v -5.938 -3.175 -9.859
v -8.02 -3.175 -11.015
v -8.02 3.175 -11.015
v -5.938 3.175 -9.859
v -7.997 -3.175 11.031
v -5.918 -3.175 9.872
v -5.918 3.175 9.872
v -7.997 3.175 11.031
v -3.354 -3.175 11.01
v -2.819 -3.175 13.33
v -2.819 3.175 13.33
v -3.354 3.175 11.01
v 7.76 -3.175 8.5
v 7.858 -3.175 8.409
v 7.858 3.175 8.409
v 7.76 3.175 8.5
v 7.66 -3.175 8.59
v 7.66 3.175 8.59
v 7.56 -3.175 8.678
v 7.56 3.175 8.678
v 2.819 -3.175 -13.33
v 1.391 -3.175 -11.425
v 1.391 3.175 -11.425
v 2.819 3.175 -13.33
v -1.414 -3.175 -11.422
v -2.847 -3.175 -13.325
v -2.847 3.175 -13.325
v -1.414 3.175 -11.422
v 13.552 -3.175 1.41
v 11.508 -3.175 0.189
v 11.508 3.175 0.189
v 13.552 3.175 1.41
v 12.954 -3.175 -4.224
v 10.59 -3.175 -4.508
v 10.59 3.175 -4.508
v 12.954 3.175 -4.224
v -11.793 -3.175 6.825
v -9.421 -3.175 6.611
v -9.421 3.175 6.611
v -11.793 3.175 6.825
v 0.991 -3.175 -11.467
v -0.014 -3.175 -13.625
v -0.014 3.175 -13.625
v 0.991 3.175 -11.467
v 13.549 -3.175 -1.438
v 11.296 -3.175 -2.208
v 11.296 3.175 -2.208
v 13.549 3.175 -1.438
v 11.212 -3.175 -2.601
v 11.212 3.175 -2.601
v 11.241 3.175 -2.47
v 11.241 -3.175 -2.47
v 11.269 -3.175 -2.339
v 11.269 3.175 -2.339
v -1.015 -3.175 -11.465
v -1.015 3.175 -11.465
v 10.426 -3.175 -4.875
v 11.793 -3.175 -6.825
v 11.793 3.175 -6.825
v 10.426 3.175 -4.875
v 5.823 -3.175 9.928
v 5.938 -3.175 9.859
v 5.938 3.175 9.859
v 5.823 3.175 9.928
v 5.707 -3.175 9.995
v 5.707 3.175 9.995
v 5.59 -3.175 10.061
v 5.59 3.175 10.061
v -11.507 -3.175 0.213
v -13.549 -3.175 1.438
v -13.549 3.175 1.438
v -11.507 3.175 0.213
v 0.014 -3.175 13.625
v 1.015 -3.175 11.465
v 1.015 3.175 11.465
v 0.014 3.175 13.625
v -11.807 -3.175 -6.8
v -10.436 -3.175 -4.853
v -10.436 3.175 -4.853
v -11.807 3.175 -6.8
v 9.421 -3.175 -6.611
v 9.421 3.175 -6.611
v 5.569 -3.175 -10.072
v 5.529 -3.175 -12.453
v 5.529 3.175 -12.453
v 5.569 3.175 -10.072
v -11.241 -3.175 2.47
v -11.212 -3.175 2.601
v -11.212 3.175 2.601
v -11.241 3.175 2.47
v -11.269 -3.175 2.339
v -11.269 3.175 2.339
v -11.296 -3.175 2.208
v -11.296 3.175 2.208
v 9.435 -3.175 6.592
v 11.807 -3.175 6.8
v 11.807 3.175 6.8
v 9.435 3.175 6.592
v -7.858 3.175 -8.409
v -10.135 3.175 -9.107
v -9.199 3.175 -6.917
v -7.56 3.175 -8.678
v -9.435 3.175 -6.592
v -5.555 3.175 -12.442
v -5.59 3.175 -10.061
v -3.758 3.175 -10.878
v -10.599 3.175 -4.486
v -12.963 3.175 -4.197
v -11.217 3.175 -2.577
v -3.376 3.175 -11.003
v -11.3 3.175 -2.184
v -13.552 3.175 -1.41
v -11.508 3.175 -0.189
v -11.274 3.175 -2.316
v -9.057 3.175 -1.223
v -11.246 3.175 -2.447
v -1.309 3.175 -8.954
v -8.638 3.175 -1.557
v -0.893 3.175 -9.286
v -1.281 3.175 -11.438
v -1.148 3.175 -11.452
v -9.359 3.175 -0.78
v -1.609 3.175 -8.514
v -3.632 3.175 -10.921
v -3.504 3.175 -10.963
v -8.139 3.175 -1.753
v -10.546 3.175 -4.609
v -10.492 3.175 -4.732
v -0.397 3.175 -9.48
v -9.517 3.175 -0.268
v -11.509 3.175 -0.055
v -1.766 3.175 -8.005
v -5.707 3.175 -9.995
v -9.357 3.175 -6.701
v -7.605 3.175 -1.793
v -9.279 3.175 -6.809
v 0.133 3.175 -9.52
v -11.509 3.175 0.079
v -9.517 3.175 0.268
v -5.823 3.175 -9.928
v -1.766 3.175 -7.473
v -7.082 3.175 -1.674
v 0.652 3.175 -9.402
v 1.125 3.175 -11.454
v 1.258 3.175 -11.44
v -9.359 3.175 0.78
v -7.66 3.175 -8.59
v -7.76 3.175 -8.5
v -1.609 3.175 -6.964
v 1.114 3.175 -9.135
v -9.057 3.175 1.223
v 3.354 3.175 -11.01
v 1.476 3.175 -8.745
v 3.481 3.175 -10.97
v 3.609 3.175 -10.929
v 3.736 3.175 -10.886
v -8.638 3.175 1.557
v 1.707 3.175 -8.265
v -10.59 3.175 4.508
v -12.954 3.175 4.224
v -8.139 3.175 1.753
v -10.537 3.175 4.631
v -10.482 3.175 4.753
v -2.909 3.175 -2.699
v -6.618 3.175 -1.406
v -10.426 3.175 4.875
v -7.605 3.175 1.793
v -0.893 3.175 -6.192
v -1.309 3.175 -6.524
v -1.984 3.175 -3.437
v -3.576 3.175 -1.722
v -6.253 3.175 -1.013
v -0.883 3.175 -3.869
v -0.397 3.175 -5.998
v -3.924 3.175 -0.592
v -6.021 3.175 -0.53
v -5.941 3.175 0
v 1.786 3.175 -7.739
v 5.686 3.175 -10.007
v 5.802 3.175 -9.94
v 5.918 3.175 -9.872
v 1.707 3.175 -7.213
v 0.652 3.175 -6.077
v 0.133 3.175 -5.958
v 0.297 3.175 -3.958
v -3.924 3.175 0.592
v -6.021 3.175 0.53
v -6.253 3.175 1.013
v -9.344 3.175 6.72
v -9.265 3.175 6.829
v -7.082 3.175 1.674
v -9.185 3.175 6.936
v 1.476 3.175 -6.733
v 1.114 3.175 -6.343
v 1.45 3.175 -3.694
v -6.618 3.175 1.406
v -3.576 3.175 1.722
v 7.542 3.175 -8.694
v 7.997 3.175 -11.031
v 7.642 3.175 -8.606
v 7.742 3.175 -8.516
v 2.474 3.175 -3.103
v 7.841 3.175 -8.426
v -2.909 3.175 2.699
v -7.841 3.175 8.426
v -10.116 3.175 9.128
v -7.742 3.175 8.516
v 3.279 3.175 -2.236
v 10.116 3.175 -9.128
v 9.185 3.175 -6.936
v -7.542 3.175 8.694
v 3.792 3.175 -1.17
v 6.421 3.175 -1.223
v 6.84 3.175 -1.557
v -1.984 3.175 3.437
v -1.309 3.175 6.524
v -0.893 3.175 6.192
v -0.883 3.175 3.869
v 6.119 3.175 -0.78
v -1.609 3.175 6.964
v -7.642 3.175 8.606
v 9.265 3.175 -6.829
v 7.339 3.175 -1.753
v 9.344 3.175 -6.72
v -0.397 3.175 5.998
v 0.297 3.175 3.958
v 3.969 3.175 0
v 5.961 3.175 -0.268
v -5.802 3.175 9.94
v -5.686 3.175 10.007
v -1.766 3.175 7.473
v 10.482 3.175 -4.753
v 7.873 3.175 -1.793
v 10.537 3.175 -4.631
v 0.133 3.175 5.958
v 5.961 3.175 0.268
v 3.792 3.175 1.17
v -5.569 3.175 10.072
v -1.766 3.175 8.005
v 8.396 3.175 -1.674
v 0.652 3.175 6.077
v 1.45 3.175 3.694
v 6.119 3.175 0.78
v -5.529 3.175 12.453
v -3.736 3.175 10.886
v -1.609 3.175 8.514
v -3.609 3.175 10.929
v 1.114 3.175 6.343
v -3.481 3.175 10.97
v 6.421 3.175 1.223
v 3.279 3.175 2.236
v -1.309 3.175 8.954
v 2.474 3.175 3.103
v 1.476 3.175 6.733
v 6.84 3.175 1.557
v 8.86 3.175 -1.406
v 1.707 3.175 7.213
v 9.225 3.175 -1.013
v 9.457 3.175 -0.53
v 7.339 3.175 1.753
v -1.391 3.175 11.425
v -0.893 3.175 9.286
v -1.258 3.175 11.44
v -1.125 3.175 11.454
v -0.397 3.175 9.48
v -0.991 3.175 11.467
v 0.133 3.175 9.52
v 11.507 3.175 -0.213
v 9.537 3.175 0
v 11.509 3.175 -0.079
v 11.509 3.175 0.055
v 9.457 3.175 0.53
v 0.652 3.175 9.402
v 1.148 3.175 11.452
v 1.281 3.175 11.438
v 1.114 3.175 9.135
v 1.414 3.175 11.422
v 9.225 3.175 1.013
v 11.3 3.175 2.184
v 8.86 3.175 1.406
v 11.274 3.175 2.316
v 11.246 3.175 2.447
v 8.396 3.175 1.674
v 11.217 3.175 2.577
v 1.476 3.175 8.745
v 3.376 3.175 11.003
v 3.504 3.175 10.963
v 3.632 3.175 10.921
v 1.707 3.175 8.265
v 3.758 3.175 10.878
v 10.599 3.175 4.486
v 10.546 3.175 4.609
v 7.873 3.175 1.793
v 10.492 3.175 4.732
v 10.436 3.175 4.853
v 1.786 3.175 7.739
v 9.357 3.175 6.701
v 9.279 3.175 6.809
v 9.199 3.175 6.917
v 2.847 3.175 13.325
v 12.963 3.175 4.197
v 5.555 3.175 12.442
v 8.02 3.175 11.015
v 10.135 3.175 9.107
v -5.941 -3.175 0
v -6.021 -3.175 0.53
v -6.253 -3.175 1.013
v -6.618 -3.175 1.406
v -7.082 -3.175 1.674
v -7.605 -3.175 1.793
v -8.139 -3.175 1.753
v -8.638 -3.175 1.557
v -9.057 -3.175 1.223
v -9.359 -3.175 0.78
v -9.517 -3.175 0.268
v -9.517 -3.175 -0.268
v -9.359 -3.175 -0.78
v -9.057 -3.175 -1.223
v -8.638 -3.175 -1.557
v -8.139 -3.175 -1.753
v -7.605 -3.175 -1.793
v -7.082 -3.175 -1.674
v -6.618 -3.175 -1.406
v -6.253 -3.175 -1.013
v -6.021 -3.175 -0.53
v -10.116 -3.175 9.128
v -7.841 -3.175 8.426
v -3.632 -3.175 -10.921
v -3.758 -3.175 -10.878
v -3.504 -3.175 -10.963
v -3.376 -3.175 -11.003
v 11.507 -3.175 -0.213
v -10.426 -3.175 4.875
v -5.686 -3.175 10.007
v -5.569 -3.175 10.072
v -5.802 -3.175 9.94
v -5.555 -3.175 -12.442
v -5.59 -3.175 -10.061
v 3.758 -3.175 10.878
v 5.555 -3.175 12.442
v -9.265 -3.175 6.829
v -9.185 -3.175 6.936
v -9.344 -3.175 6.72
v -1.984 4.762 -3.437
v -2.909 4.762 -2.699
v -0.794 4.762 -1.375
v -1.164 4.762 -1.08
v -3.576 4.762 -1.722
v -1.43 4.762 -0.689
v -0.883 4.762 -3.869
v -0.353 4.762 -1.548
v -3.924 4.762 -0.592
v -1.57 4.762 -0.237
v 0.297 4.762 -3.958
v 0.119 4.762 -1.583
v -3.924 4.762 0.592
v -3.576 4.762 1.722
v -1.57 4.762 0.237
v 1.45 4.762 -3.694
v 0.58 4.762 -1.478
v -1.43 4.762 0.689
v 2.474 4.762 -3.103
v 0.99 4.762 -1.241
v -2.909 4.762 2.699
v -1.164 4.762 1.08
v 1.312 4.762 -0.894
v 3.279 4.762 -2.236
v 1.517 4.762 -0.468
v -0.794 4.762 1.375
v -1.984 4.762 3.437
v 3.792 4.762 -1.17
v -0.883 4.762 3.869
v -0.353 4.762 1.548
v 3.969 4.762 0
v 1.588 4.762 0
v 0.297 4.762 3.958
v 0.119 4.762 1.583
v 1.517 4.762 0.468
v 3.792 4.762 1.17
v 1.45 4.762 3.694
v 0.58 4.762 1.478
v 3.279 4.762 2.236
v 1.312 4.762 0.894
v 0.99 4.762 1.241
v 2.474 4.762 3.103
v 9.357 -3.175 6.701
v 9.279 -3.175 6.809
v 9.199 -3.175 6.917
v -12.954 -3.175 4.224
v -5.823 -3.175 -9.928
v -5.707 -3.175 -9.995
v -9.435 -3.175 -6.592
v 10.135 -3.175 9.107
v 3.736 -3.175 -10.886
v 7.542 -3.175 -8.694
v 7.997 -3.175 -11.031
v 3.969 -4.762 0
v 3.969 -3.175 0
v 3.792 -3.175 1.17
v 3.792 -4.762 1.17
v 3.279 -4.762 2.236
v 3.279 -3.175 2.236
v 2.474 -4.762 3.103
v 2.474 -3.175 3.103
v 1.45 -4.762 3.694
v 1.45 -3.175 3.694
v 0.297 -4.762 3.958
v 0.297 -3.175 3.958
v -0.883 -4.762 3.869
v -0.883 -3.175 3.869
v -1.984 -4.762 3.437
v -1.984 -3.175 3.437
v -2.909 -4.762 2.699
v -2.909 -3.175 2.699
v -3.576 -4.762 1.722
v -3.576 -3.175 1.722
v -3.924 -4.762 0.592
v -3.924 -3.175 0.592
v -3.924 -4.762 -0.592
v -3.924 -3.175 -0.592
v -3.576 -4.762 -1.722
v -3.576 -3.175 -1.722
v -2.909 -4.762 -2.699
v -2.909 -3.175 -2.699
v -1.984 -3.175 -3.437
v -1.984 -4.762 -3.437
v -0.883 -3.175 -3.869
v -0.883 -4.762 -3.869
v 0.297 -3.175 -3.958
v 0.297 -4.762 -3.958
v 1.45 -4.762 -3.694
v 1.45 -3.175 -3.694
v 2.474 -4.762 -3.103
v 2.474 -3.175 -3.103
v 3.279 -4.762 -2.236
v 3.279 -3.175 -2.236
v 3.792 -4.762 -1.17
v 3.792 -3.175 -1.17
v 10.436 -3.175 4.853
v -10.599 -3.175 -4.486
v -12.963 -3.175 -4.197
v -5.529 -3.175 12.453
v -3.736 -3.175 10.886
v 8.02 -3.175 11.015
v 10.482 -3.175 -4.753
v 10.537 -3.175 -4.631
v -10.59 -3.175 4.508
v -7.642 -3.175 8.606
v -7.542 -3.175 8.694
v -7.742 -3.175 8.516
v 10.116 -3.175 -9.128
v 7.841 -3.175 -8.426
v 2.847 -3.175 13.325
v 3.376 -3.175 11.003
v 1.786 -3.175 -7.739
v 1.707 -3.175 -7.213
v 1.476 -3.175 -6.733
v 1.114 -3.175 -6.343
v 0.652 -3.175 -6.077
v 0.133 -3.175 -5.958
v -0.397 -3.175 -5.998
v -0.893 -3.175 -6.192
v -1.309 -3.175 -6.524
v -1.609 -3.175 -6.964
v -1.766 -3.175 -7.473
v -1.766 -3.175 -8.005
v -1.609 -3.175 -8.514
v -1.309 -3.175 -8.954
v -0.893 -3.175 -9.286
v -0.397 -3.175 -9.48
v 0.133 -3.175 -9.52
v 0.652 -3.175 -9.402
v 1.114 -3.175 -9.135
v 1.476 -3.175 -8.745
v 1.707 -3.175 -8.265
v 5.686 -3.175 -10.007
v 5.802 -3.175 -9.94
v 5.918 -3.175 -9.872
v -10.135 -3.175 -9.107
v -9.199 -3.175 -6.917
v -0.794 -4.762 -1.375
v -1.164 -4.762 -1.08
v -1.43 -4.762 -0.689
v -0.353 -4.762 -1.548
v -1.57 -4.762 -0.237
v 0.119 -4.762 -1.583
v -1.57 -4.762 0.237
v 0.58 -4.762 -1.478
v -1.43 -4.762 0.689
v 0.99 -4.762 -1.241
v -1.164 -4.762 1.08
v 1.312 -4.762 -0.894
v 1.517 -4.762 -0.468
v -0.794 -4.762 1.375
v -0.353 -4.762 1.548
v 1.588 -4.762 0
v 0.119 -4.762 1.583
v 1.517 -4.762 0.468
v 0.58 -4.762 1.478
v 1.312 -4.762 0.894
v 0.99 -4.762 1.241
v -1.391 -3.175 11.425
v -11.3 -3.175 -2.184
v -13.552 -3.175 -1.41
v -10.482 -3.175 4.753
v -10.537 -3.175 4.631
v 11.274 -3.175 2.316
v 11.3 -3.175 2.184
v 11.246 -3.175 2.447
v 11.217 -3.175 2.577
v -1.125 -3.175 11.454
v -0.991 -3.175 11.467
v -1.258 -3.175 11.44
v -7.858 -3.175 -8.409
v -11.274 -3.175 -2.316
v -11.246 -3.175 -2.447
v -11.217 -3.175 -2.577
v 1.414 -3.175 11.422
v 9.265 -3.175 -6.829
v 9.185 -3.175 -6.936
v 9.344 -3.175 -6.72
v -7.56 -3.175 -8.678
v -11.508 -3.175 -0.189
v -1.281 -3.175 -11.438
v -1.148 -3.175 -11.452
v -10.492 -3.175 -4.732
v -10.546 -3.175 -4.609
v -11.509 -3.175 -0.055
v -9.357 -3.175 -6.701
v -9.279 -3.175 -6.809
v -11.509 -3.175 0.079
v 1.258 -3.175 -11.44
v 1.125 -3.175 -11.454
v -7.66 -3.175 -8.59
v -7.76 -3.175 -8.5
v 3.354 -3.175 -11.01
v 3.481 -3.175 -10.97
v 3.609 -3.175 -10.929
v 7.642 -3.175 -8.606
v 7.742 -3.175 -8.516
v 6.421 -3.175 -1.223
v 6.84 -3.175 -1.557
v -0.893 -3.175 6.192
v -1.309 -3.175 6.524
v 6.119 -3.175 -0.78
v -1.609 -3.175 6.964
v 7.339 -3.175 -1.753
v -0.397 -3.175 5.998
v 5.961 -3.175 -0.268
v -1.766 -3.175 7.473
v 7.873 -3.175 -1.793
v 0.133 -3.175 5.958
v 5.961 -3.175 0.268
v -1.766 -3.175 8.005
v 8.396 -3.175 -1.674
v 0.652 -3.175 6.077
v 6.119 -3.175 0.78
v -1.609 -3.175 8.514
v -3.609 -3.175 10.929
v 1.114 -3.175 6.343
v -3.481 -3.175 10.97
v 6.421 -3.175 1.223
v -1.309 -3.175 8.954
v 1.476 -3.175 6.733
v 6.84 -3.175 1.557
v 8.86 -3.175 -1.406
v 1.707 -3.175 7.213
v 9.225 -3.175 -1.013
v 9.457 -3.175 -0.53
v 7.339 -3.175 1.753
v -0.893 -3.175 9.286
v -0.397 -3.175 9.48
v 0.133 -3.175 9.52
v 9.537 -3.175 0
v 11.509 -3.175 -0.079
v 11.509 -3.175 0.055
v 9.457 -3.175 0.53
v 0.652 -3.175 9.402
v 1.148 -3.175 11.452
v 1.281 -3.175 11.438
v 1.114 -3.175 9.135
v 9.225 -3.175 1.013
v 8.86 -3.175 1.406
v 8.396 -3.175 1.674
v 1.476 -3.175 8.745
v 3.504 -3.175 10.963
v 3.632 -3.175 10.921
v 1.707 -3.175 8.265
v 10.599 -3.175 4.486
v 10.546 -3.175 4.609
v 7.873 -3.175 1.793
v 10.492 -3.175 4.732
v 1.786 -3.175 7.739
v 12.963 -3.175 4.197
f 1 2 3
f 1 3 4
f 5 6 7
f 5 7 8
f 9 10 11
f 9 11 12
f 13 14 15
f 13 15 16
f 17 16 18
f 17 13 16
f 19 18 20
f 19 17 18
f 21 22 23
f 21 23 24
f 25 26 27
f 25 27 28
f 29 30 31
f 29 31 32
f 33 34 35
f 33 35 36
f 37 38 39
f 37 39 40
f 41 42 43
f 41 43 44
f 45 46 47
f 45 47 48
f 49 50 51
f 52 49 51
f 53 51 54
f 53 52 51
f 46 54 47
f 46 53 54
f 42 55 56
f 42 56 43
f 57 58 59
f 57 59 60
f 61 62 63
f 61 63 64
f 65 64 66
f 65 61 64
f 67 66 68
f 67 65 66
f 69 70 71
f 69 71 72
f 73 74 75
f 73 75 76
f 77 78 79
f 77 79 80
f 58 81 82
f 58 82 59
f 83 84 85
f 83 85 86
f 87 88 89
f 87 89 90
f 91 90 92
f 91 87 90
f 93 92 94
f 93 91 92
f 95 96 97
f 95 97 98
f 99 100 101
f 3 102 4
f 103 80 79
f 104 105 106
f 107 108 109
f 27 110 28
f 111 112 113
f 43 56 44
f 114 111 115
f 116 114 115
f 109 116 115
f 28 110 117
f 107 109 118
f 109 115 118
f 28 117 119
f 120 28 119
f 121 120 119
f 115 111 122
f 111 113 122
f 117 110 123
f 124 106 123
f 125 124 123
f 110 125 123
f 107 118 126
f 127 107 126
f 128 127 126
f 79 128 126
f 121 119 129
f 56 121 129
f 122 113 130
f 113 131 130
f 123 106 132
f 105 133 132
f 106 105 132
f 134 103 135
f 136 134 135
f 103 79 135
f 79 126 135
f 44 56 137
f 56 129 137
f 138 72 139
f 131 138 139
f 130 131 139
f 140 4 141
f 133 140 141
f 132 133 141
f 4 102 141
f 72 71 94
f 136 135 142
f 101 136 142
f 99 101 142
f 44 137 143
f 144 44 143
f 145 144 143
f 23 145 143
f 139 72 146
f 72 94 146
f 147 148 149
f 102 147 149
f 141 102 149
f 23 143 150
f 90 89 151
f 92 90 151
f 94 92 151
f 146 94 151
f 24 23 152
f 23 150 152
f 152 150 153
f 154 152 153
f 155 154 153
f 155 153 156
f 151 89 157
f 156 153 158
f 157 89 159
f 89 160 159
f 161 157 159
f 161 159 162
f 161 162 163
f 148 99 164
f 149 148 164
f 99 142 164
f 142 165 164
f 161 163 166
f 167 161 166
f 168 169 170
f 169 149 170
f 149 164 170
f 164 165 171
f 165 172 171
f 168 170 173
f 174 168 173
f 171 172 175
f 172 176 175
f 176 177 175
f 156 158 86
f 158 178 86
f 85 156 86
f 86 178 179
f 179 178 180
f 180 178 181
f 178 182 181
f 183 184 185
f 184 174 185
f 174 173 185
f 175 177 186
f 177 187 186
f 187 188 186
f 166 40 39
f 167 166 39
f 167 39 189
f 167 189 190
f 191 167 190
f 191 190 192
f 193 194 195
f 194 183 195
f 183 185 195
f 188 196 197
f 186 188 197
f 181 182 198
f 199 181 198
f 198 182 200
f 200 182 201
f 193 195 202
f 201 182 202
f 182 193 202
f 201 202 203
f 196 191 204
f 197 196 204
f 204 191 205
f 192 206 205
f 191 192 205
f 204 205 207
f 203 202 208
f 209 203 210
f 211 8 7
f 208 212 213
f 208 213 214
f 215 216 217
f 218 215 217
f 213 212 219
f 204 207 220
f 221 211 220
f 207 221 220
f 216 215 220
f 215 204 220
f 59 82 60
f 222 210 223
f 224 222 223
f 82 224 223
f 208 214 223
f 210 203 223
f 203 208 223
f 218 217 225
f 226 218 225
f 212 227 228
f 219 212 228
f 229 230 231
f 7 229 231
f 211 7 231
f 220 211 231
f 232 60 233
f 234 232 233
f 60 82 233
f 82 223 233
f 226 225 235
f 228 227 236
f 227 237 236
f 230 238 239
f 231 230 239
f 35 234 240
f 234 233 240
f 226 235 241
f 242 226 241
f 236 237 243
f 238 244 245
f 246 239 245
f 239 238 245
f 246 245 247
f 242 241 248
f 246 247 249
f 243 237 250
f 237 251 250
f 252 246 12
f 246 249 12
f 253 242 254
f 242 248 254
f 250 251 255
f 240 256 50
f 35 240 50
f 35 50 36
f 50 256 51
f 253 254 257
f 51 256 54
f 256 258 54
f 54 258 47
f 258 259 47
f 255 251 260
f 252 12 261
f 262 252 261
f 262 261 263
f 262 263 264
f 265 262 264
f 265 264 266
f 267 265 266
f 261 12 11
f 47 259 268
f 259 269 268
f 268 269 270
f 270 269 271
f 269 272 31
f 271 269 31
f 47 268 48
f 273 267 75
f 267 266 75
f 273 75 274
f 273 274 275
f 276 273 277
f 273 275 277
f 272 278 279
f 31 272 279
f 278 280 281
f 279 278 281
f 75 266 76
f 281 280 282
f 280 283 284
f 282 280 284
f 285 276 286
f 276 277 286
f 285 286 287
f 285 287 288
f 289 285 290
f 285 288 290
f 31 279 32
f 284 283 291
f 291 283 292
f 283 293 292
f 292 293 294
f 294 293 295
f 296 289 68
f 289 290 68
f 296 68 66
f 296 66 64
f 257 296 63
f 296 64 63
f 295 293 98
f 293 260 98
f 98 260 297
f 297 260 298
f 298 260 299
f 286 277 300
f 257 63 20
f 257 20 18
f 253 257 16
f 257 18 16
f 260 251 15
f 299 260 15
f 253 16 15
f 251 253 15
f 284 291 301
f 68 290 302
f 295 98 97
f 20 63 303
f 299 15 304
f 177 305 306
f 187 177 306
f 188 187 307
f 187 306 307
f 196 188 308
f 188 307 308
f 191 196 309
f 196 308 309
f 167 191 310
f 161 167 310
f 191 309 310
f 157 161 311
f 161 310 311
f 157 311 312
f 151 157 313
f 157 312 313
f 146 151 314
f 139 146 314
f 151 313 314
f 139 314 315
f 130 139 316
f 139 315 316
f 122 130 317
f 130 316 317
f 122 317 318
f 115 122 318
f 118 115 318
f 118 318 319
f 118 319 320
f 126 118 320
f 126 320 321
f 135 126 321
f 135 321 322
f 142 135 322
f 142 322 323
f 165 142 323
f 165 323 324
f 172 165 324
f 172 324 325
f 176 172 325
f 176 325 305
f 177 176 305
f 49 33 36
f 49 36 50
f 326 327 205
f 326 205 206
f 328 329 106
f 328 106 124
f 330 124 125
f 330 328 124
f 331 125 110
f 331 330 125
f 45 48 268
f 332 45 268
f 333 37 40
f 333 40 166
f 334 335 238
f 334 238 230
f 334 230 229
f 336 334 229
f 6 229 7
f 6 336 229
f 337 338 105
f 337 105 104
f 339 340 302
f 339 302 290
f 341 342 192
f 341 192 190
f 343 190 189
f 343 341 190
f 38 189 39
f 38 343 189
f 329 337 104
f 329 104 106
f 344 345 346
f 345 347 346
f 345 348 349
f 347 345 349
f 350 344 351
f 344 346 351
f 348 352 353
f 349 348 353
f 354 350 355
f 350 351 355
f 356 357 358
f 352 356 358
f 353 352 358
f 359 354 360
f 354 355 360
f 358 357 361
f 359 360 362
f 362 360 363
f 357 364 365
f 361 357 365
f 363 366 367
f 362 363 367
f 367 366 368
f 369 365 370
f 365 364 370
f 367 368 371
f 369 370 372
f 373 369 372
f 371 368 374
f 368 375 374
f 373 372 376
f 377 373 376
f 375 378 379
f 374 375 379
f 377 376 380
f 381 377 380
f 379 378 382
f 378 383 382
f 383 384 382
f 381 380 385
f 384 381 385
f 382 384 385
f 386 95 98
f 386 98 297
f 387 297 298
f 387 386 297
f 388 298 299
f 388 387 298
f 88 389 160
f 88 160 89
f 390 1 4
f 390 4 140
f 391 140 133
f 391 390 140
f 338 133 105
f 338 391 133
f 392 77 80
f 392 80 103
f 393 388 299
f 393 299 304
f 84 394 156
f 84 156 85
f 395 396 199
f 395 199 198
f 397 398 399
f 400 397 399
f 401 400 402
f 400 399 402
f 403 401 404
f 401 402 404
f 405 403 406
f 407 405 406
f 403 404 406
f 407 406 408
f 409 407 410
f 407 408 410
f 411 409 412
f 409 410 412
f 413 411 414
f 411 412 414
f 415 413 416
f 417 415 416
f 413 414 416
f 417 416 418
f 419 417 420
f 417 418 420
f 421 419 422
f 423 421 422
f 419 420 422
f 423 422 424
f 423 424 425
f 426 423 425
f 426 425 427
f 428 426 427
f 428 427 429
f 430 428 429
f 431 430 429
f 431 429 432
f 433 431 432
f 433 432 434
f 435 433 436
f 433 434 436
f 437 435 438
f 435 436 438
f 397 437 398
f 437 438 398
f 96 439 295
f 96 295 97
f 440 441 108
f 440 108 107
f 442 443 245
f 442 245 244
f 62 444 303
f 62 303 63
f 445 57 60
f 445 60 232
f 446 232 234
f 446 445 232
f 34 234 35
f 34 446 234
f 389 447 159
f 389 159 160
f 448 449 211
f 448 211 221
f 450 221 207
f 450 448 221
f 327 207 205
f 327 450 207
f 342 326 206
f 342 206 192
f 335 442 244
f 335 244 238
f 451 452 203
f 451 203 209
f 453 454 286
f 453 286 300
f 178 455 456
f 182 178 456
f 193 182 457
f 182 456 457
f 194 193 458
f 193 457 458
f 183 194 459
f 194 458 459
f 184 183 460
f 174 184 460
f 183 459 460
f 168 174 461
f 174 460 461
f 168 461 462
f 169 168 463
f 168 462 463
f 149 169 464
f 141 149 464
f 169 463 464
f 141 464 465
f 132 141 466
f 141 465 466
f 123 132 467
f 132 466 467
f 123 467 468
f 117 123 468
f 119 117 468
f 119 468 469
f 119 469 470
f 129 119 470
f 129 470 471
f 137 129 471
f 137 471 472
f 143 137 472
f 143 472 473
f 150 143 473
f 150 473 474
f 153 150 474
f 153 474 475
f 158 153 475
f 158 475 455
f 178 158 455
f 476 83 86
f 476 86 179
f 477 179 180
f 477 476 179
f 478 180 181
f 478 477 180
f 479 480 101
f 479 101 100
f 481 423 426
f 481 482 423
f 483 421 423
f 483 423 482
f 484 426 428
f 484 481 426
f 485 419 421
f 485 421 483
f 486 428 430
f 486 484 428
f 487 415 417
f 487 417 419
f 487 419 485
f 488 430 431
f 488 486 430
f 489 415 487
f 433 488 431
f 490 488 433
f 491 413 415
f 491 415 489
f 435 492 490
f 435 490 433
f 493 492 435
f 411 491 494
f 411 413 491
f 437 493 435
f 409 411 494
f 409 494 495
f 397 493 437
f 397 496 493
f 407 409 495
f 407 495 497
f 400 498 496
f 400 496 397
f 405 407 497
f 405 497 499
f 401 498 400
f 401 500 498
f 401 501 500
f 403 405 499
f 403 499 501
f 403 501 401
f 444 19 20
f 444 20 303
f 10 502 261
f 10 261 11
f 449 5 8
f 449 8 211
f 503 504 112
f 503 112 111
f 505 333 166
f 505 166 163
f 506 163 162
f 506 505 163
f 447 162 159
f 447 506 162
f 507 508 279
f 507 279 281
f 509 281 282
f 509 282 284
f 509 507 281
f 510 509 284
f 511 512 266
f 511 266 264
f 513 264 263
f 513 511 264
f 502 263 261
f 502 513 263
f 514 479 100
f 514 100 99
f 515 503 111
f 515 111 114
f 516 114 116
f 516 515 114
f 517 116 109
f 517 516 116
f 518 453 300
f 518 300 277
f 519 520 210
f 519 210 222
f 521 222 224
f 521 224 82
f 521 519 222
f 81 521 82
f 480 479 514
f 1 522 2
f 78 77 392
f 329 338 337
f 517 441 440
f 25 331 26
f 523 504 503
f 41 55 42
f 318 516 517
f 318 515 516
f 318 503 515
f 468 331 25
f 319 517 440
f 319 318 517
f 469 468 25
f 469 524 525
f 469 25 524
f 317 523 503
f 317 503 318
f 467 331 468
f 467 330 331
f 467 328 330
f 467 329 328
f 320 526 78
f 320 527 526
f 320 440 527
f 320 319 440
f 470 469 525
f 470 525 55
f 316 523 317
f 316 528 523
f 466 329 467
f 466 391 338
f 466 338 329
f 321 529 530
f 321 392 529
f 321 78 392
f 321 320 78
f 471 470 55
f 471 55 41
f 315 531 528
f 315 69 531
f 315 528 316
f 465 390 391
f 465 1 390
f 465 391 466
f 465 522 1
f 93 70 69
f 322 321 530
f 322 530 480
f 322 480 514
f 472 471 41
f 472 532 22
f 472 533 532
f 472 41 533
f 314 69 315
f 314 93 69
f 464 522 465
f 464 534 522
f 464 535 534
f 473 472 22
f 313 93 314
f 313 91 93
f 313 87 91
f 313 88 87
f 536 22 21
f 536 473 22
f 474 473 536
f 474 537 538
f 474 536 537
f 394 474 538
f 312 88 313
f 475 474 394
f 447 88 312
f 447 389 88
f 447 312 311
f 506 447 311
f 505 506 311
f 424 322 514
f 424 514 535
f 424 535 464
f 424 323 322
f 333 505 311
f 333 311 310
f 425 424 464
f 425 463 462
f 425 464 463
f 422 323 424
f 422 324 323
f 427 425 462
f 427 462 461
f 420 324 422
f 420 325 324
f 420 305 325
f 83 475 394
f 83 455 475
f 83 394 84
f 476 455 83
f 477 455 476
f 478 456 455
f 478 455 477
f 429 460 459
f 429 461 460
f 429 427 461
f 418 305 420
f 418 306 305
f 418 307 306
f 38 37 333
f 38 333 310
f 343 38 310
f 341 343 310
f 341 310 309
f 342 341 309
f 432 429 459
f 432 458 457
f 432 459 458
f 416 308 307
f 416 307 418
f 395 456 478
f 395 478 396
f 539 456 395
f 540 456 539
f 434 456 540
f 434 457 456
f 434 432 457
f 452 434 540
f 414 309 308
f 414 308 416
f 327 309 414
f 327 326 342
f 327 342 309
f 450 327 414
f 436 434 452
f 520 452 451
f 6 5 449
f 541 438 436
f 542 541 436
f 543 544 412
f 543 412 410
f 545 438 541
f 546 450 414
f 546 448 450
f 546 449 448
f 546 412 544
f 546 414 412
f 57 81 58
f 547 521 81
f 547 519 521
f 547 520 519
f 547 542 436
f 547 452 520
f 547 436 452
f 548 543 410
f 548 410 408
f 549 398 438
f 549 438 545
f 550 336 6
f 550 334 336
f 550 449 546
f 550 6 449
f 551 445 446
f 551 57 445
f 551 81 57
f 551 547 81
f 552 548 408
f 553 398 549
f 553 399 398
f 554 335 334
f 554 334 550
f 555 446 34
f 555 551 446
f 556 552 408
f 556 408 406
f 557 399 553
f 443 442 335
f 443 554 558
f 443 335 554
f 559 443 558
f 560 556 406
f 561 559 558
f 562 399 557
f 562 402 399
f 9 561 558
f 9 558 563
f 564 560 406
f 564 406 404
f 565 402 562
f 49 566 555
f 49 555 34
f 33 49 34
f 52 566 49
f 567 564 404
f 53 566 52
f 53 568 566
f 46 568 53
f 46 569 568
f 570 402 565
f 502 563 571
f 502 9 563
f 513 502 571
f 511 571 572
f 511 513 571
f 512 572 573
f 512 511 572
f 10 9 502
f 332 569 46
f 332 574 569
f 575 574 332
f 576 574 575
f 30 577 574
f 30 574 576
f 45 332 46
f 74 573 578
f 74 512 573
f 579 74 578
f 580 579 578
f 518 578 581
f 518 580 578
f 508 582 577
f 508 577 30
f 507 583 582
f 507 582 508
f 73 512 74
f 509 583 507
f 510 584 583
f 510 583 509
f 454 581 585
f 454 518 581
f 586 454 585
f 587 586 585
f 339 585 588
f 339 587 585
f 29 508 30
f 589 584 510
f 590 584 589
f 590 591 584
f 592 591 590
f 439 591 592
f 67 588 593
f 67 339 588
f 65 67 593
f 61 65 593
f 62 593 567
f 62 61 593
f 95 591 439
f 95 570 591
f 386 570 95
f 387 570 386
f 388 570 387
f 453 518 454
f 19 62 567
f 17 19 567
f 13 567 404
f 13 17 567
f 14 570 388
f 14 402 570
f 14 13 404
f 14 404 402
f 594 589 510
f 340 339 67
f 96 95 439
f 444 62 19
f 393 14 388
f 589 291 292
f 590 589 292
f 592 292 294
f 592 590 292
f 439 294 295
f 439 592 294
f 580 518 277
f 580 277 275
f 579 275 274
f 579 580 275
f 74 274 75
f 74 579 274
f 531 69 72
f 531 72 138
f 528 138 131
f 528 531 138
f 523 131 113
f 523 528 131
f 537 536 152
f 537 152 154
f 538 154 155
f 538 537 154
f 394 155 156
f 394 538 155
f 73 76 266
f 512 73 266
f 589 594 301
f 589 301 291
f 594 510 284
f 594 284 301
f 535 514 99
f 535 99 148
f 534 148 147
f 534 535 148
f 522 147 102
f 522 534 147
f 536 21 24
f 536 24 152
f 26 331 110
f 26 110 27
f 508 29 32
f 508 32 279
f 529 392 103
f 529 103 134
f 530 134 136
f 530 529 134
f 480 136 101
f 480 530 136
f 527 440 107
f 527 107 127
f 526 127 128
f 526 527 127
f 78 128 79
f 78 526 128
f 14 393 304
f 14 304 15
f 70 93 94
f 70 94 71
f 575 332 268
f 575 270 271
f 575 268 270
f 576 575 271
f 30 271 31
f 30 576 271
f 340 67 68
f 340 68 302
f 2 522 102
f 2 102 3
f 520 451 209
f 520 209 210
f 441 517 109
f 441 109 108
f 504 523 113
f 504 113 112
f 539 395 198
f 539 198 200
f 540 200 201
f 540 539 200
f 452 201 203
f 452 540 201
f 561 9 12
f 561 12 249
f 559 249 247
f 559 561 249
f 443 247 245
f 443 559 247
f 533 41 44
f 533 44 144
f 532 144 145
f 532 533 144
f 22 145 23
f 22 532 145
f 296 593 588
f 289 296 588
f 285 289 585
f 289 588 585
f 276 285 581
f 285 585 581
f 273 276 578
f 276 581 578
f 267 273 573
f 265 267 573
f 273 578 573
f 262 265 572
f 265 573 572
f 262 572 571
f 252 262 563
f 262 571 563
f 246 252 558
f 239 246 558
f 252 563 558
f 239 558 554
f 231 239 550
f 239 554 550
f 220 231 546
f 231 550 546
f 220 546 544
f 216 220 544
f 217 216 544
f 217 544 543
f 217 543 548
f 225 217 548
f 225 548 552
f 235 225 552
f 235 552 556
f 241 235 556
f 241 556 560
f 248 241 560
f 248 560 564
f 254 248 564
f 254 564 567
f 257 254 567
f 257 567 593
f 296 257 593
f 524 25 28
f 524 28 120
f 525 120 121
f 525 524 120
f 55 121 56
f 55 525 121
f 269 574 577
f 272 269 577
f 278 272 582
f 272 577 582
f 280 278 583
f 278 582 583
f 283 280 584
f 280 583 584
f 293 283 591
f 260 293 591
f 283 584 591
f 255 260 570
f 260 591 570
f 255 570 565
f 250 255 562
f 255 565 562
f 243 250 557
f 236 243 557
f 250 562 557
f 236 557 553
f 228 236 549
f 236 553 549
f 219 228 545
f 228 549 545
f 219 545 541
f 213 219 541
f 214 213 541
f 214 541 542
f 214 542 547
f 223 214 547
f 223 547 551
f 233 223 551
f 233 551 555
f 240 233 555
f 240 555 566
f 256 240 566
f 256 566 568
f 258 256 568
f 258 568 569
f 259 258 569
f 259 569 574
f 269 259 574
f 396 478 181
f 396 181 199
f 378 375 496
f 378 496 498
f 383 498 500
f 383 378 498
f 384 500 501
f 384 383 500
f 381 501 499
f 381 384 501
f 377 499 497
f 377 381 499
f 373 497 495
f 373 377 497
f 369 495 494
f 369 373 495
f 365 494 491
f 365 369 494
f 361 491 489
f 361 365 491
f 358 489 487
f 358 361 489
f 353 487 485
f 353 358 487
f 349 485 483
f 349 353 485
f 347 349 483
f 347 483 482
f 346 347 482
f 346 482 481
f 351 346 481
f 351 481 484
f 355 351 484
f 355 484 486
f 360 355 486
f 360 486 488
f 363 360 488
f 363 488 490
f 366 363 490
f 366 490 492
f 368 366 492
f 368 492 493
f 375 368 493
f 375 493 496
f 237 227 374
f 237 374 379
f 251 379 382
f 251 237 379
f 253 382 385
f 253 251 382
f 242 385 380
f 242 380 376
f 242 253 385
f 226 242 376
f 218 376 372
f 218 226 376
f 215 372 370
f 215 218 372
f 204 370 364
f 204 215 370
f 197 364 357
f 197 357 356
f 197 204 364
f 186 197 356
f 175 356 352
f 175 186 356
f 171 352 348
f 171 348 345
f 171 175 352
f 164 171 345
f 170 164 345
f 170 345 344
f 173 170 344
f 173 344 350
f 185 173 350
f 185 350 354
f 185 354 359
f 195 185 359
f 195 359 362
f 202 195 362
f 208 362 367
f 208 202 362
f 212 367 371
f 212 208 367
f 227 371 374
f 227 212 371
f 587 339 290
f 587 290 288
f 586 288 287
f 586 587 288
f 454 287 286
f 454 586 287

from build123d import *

# Parameters (mm, degrees)
F0_R      = 11.509375
F1_DEPTH  = 3.175
F2_R      = 3.96875
F3_DEPTH  = 1.5875
F4_R      = 1.5875
F5_DEPTH  = 7.9385
F6_R      = 1.7859375
F6_R_2    = 1.7983109728
F7_DEPTH  = 6.351
F9_DEPTH  = 6.35
F10_COUNT = 30


with BuildPart() as f1:
    # F0 (on Front) → F1 (new body, symmetric)
    with BuildSketch(Plane.XZ):
        Circle(F0_R)
    extrude(amount=F1_DEPTH, both=True)

    # F2 (on face) → F3 (join)
    with BuildSketch(Plane.XZ.offset(3.175)):
        Circle(F2_R)
    extrude(amount=F3_DEPTH)

    # F4 (on face) → F5 (cut, through all)
    with BuildSketch(Plane.XZ.offset(4.7625)):
        Circle(F4_R)
    extrude(amount=-F5_DEPTH, mode=Mode.SUBTRACT)

    # F6 (on face) → F7 (cut, through all)
    with BuildSketch(Plane.XZ.offset(3.175)):
        with Locations((0, 7.7390625)):
            Circle(F6_R)
        with Locations((0, -7.7390625)):
            Circle(F6_R)
        with Locations((-7.7390625, 0)):
            Circle(F6_R_2)
        with Locations((7.7390625, 0)):
            Circle(F6_R_2)
    extrude(amount=-F7_DEPTH, mode=Mode.SUBTRACT)



with BuildPart() as f9:
    # F8 (on face) → F9 (new body, through all)
    with BuildSketch(Plane.XZ.offset(3.175)):
        with BuildLine():
            Line((0.0141249861, 13.6252297198), (-0.9912214727, 11.4666120926))
            ThreePointArc((-0.9912214727, 11.4666120926), (0.011931518, 11.5093688154), (1.0149937027, 11.464532292))
            Line((1.0149937027, 11.464532292), (0.0141249861, 13.6252297198))
        make_face()
    extrude(amount=-F9_DEPTH)


with BuildPart() as f10_1:
    # F10: instance of F9
    add(f9.part.rotate(Axis((0, -3.175, 0), (0, -1, 0)), 1 * 360 / F10_COUNT))


with BuildPart() as f10_2:
    # F10: instance of F9
    add(f9.part.rotate(Axis((0, -3.175, 0), (0, -1, 0)), 2 * 360 / F10_COUNT))


with BuildPart() as f10_3:
    # F10: instance of F9
    add(f9.part.rotate(Axis((0, -3.175, 0), (0, -1, 0)), 3 * 360 / F10_COUNT))


with BuildPart() as f10_4:
    # F10: instance of F9
    add(f9.part.rotate(Axis((0, -3.175, 0), (0, -1, 0)), 4 * 360 / F10_COUNT))


with BuildPart() as f10_5:
    # F10: instance of F9
    add(f9.part.rotate(Axis((0, -3.175, 0), (0, -1, 0)), 5 * 360 / F10_COUNT))


with BuildPart() as f10_6:
    # F10: instance of F9
    add(f9.part.rotate(Axis((0, -3.175, 0), (0, -1, 0)), 6 * 360 / F10_COUNT))


with BuildPart() as f10_7:
    # F10: instance of F9
    add(f9.part.rotate(Axis((0, -3.175, 0), (0, -1, 0)), 7 * 360 / F10_COUNT))


with BuildPart() as f10_8:
    # F10: instance of F9
    add(f9.part.rotate(Axis((0, -3.175, 0), (0, -1, 0)), 8 * 360 / F10_COUNT))


with BuildPart() as f10_9:
    # F10: instance of F9
    add(f9.part.rotate(Axis((0, -3.175, 0), (0, -1, 0)), 9 * 360 / F10_COUNT))


with BuildPart() as f10_10:
    # F10: instance of F9
    add(f9.part.rotate(Axis((0, -3.175, 0), (0, -1, 0)), 10 * 360 / F10_COUNT))


with BuildPart() as f10_11:
    # F10: instance of F9
    add(f9.part.rotate(Axis((0, -3.175, 0), (0, -1, 0)), 11 * 360 / F10_COUNT))


with BuildPart() as f10_12:
    # F10: instance of F9
    add(f9.part.rotate(Axis((0, -3.175, 0), (0, -1, 0)), 12 * 360 / F10_COUNT))


with BuildPart() as f10_13:
    # F10: instance of F9
    add(f9.part.rotate(Axis((0, -3.175, 0), (0, -1, 0)), 13 * 360 / F10_COUNT))


with BuildPart() as f10_14:
    # F10: instance of F9
    add(f9.part.rotate(Axis((0, -3.175, 0), (0, -1, 0)), 14 * 360 / F10_COUNT))


with BuildPart() as f10_15:
    # F10: instance of F9
    add(f9.part.rotate(Axis((0, -3.175, 0), (0, -1, 0)), 15 * 360 / F10_COUNT))


with BuildPart() as f10_16:
    # F10: instance of F9
    add(f9.part.rotate(Axis((0, -3.175, 0), (0, -1, 0)), 16 * 360 / F10_COUNT))


with BuildPart() as f10_17:
    # F10: instance of F9
    add(f9.part.rotate(Axis((0, -3.175, 0), (0, -1, 0)), 17 * 360 / F10_COUNT))


with BuildPart() as f10_18:
    # F10: instance of F9
    add(f9.part.rotate(Axis((0, -3.175, 0), (0, -1, 0)), 18 * 360 / F10_COUNT))


with BuildPart() as f10_19:
    # F10: instance of F9
    add(f9.part.rotate(Axis((0, -3.175, 0), (0, -1, 0)), 19 * 360 / F10_COUNT))


with BuildPart() as f10_20:
    # F10: instance of F9
    add(f9.part.rotate(Axis((0, -3.175, 0), (0, -1, 0)), 20 * 360 / F10_COUNT))


with BuildPart() as f10_21:
    # F10: instance of F9
    add(f9.part.rotate(Axis((0, -3.175, 0), (0, -1, 0)), 21 * 360 / F10_COUNT))


with BuildPart() as f10_22:
    # F10: instance of F9
    add(f9.part.rotate(Axis((0, -3.175, 0), (0, -1, 0)), 22 * 360 / F10_COUNT))


with BuildPart() as f10_23:
    # F10: instance of F9
    add(f9.part.rotate(Axis((0, -3.175, 0), (0, -1, 0)), 23 * 360 / F10_COUNT))


with BuildPart() as f10_24:
    # F10: instance of F9
    add(f9.part.rotate(Axis((0, -3.175, 0), (0, -1, 0)), 24 * 360 / F10_COUNT))


with BuildPart() as f10_25:
    # F10: instance of F9
    add(f9.part.rotate(Axis((0, -3.175, 0), (0, -1, 0)), 25 * 360 / F10_COUNT))


with BuildPart() as f10_26:
    # F10: instance of F9
    add(f9.part.rotate(Axis((0, -3.175, 0), (0, -1, 0)), 26 * 360 / F10_COUNT))


with BuildPart() as f10_27:
    # F10: instance of F9
    add(f9.part.rotate(Axis((0, -3.175, 0), (0, -1, 0)), 27 * 360 / F10_COUNT))


with BuildPart() as f10_28:
    # F10: instance of F9
    add(f9.part.rotate(Axis((0, -3.175, 0), (0, -1, 0)), 28 * 360 / F10_COUNT))


with BuildPart() as f10_29:
    # F10: instance of F9
    add(f9.part.rotate(Axis((0, -3.175, 0), (0, -1, 0)), 29 * 360 / F10_COUNT))


with BuildPart() as f1_1:
    add(f1.part)

    add(f9.part)  # F11 merges F9

    add(f10_1.part)  # F11 merges F10_1

    add(f10_2.part)  # F11 merges F10_2

    add(f10_3.part)  # F11 merges F10_3

    add(f10_4.part)  # F11 merges F10_4

    add(f10_5.part)  # F11 merges F10_5

    add(f10_6.part)  # F11 merges F10_6

    add(f10_7.part)  # F11 merges F10_7

    add(f10_8.part)  # F11 merges F10_8

    add(f10_9.part)  # F11 merges F10_9

    add(f10_10.part)  # F11 merges F10_10

    add(f10_11.part)  # F11 merges F10_11

    add(f10_12.part)  # F11 merges F10_12

    add(f10_13.part)  # F11 merges F10_13

    add(f10_14.part)  # F11 merges F10_14

    add(f10_15.part)  # F11 merges F10_15

    add(f10_16.part)  # F11 merges F10_16

    add(f10_17.part)  # F11 merges F10_17

    add(f10_18.part)  # F11 merges F10_18

    add(f10_19.part)  # F11 merges F10_19

    add(f10_20.part)  # F11 merges F10_20

    add(f10_21.part)  # F11 merges F10_21

    add(f10_22.part)  # F11 merges F10_22

    add(f10_23.part)  # F11 merges F10_23

    add(f10_24.part)  # F11 merges F10_24

    add(f10_25.part)  # F11 merges F10_25

    add(f10_26.part)  # F11 merges F10_26

    add(f10_27.part)  # F11 merges F10_27

    add(f10_28.part)  # F11 merges F10_28

    add(f10_29.part)  # F11 merges F10_29
    # F11: F1 across plane
    add(f1.part.mirror(Plane.XZ))


solid = f1_1.part
